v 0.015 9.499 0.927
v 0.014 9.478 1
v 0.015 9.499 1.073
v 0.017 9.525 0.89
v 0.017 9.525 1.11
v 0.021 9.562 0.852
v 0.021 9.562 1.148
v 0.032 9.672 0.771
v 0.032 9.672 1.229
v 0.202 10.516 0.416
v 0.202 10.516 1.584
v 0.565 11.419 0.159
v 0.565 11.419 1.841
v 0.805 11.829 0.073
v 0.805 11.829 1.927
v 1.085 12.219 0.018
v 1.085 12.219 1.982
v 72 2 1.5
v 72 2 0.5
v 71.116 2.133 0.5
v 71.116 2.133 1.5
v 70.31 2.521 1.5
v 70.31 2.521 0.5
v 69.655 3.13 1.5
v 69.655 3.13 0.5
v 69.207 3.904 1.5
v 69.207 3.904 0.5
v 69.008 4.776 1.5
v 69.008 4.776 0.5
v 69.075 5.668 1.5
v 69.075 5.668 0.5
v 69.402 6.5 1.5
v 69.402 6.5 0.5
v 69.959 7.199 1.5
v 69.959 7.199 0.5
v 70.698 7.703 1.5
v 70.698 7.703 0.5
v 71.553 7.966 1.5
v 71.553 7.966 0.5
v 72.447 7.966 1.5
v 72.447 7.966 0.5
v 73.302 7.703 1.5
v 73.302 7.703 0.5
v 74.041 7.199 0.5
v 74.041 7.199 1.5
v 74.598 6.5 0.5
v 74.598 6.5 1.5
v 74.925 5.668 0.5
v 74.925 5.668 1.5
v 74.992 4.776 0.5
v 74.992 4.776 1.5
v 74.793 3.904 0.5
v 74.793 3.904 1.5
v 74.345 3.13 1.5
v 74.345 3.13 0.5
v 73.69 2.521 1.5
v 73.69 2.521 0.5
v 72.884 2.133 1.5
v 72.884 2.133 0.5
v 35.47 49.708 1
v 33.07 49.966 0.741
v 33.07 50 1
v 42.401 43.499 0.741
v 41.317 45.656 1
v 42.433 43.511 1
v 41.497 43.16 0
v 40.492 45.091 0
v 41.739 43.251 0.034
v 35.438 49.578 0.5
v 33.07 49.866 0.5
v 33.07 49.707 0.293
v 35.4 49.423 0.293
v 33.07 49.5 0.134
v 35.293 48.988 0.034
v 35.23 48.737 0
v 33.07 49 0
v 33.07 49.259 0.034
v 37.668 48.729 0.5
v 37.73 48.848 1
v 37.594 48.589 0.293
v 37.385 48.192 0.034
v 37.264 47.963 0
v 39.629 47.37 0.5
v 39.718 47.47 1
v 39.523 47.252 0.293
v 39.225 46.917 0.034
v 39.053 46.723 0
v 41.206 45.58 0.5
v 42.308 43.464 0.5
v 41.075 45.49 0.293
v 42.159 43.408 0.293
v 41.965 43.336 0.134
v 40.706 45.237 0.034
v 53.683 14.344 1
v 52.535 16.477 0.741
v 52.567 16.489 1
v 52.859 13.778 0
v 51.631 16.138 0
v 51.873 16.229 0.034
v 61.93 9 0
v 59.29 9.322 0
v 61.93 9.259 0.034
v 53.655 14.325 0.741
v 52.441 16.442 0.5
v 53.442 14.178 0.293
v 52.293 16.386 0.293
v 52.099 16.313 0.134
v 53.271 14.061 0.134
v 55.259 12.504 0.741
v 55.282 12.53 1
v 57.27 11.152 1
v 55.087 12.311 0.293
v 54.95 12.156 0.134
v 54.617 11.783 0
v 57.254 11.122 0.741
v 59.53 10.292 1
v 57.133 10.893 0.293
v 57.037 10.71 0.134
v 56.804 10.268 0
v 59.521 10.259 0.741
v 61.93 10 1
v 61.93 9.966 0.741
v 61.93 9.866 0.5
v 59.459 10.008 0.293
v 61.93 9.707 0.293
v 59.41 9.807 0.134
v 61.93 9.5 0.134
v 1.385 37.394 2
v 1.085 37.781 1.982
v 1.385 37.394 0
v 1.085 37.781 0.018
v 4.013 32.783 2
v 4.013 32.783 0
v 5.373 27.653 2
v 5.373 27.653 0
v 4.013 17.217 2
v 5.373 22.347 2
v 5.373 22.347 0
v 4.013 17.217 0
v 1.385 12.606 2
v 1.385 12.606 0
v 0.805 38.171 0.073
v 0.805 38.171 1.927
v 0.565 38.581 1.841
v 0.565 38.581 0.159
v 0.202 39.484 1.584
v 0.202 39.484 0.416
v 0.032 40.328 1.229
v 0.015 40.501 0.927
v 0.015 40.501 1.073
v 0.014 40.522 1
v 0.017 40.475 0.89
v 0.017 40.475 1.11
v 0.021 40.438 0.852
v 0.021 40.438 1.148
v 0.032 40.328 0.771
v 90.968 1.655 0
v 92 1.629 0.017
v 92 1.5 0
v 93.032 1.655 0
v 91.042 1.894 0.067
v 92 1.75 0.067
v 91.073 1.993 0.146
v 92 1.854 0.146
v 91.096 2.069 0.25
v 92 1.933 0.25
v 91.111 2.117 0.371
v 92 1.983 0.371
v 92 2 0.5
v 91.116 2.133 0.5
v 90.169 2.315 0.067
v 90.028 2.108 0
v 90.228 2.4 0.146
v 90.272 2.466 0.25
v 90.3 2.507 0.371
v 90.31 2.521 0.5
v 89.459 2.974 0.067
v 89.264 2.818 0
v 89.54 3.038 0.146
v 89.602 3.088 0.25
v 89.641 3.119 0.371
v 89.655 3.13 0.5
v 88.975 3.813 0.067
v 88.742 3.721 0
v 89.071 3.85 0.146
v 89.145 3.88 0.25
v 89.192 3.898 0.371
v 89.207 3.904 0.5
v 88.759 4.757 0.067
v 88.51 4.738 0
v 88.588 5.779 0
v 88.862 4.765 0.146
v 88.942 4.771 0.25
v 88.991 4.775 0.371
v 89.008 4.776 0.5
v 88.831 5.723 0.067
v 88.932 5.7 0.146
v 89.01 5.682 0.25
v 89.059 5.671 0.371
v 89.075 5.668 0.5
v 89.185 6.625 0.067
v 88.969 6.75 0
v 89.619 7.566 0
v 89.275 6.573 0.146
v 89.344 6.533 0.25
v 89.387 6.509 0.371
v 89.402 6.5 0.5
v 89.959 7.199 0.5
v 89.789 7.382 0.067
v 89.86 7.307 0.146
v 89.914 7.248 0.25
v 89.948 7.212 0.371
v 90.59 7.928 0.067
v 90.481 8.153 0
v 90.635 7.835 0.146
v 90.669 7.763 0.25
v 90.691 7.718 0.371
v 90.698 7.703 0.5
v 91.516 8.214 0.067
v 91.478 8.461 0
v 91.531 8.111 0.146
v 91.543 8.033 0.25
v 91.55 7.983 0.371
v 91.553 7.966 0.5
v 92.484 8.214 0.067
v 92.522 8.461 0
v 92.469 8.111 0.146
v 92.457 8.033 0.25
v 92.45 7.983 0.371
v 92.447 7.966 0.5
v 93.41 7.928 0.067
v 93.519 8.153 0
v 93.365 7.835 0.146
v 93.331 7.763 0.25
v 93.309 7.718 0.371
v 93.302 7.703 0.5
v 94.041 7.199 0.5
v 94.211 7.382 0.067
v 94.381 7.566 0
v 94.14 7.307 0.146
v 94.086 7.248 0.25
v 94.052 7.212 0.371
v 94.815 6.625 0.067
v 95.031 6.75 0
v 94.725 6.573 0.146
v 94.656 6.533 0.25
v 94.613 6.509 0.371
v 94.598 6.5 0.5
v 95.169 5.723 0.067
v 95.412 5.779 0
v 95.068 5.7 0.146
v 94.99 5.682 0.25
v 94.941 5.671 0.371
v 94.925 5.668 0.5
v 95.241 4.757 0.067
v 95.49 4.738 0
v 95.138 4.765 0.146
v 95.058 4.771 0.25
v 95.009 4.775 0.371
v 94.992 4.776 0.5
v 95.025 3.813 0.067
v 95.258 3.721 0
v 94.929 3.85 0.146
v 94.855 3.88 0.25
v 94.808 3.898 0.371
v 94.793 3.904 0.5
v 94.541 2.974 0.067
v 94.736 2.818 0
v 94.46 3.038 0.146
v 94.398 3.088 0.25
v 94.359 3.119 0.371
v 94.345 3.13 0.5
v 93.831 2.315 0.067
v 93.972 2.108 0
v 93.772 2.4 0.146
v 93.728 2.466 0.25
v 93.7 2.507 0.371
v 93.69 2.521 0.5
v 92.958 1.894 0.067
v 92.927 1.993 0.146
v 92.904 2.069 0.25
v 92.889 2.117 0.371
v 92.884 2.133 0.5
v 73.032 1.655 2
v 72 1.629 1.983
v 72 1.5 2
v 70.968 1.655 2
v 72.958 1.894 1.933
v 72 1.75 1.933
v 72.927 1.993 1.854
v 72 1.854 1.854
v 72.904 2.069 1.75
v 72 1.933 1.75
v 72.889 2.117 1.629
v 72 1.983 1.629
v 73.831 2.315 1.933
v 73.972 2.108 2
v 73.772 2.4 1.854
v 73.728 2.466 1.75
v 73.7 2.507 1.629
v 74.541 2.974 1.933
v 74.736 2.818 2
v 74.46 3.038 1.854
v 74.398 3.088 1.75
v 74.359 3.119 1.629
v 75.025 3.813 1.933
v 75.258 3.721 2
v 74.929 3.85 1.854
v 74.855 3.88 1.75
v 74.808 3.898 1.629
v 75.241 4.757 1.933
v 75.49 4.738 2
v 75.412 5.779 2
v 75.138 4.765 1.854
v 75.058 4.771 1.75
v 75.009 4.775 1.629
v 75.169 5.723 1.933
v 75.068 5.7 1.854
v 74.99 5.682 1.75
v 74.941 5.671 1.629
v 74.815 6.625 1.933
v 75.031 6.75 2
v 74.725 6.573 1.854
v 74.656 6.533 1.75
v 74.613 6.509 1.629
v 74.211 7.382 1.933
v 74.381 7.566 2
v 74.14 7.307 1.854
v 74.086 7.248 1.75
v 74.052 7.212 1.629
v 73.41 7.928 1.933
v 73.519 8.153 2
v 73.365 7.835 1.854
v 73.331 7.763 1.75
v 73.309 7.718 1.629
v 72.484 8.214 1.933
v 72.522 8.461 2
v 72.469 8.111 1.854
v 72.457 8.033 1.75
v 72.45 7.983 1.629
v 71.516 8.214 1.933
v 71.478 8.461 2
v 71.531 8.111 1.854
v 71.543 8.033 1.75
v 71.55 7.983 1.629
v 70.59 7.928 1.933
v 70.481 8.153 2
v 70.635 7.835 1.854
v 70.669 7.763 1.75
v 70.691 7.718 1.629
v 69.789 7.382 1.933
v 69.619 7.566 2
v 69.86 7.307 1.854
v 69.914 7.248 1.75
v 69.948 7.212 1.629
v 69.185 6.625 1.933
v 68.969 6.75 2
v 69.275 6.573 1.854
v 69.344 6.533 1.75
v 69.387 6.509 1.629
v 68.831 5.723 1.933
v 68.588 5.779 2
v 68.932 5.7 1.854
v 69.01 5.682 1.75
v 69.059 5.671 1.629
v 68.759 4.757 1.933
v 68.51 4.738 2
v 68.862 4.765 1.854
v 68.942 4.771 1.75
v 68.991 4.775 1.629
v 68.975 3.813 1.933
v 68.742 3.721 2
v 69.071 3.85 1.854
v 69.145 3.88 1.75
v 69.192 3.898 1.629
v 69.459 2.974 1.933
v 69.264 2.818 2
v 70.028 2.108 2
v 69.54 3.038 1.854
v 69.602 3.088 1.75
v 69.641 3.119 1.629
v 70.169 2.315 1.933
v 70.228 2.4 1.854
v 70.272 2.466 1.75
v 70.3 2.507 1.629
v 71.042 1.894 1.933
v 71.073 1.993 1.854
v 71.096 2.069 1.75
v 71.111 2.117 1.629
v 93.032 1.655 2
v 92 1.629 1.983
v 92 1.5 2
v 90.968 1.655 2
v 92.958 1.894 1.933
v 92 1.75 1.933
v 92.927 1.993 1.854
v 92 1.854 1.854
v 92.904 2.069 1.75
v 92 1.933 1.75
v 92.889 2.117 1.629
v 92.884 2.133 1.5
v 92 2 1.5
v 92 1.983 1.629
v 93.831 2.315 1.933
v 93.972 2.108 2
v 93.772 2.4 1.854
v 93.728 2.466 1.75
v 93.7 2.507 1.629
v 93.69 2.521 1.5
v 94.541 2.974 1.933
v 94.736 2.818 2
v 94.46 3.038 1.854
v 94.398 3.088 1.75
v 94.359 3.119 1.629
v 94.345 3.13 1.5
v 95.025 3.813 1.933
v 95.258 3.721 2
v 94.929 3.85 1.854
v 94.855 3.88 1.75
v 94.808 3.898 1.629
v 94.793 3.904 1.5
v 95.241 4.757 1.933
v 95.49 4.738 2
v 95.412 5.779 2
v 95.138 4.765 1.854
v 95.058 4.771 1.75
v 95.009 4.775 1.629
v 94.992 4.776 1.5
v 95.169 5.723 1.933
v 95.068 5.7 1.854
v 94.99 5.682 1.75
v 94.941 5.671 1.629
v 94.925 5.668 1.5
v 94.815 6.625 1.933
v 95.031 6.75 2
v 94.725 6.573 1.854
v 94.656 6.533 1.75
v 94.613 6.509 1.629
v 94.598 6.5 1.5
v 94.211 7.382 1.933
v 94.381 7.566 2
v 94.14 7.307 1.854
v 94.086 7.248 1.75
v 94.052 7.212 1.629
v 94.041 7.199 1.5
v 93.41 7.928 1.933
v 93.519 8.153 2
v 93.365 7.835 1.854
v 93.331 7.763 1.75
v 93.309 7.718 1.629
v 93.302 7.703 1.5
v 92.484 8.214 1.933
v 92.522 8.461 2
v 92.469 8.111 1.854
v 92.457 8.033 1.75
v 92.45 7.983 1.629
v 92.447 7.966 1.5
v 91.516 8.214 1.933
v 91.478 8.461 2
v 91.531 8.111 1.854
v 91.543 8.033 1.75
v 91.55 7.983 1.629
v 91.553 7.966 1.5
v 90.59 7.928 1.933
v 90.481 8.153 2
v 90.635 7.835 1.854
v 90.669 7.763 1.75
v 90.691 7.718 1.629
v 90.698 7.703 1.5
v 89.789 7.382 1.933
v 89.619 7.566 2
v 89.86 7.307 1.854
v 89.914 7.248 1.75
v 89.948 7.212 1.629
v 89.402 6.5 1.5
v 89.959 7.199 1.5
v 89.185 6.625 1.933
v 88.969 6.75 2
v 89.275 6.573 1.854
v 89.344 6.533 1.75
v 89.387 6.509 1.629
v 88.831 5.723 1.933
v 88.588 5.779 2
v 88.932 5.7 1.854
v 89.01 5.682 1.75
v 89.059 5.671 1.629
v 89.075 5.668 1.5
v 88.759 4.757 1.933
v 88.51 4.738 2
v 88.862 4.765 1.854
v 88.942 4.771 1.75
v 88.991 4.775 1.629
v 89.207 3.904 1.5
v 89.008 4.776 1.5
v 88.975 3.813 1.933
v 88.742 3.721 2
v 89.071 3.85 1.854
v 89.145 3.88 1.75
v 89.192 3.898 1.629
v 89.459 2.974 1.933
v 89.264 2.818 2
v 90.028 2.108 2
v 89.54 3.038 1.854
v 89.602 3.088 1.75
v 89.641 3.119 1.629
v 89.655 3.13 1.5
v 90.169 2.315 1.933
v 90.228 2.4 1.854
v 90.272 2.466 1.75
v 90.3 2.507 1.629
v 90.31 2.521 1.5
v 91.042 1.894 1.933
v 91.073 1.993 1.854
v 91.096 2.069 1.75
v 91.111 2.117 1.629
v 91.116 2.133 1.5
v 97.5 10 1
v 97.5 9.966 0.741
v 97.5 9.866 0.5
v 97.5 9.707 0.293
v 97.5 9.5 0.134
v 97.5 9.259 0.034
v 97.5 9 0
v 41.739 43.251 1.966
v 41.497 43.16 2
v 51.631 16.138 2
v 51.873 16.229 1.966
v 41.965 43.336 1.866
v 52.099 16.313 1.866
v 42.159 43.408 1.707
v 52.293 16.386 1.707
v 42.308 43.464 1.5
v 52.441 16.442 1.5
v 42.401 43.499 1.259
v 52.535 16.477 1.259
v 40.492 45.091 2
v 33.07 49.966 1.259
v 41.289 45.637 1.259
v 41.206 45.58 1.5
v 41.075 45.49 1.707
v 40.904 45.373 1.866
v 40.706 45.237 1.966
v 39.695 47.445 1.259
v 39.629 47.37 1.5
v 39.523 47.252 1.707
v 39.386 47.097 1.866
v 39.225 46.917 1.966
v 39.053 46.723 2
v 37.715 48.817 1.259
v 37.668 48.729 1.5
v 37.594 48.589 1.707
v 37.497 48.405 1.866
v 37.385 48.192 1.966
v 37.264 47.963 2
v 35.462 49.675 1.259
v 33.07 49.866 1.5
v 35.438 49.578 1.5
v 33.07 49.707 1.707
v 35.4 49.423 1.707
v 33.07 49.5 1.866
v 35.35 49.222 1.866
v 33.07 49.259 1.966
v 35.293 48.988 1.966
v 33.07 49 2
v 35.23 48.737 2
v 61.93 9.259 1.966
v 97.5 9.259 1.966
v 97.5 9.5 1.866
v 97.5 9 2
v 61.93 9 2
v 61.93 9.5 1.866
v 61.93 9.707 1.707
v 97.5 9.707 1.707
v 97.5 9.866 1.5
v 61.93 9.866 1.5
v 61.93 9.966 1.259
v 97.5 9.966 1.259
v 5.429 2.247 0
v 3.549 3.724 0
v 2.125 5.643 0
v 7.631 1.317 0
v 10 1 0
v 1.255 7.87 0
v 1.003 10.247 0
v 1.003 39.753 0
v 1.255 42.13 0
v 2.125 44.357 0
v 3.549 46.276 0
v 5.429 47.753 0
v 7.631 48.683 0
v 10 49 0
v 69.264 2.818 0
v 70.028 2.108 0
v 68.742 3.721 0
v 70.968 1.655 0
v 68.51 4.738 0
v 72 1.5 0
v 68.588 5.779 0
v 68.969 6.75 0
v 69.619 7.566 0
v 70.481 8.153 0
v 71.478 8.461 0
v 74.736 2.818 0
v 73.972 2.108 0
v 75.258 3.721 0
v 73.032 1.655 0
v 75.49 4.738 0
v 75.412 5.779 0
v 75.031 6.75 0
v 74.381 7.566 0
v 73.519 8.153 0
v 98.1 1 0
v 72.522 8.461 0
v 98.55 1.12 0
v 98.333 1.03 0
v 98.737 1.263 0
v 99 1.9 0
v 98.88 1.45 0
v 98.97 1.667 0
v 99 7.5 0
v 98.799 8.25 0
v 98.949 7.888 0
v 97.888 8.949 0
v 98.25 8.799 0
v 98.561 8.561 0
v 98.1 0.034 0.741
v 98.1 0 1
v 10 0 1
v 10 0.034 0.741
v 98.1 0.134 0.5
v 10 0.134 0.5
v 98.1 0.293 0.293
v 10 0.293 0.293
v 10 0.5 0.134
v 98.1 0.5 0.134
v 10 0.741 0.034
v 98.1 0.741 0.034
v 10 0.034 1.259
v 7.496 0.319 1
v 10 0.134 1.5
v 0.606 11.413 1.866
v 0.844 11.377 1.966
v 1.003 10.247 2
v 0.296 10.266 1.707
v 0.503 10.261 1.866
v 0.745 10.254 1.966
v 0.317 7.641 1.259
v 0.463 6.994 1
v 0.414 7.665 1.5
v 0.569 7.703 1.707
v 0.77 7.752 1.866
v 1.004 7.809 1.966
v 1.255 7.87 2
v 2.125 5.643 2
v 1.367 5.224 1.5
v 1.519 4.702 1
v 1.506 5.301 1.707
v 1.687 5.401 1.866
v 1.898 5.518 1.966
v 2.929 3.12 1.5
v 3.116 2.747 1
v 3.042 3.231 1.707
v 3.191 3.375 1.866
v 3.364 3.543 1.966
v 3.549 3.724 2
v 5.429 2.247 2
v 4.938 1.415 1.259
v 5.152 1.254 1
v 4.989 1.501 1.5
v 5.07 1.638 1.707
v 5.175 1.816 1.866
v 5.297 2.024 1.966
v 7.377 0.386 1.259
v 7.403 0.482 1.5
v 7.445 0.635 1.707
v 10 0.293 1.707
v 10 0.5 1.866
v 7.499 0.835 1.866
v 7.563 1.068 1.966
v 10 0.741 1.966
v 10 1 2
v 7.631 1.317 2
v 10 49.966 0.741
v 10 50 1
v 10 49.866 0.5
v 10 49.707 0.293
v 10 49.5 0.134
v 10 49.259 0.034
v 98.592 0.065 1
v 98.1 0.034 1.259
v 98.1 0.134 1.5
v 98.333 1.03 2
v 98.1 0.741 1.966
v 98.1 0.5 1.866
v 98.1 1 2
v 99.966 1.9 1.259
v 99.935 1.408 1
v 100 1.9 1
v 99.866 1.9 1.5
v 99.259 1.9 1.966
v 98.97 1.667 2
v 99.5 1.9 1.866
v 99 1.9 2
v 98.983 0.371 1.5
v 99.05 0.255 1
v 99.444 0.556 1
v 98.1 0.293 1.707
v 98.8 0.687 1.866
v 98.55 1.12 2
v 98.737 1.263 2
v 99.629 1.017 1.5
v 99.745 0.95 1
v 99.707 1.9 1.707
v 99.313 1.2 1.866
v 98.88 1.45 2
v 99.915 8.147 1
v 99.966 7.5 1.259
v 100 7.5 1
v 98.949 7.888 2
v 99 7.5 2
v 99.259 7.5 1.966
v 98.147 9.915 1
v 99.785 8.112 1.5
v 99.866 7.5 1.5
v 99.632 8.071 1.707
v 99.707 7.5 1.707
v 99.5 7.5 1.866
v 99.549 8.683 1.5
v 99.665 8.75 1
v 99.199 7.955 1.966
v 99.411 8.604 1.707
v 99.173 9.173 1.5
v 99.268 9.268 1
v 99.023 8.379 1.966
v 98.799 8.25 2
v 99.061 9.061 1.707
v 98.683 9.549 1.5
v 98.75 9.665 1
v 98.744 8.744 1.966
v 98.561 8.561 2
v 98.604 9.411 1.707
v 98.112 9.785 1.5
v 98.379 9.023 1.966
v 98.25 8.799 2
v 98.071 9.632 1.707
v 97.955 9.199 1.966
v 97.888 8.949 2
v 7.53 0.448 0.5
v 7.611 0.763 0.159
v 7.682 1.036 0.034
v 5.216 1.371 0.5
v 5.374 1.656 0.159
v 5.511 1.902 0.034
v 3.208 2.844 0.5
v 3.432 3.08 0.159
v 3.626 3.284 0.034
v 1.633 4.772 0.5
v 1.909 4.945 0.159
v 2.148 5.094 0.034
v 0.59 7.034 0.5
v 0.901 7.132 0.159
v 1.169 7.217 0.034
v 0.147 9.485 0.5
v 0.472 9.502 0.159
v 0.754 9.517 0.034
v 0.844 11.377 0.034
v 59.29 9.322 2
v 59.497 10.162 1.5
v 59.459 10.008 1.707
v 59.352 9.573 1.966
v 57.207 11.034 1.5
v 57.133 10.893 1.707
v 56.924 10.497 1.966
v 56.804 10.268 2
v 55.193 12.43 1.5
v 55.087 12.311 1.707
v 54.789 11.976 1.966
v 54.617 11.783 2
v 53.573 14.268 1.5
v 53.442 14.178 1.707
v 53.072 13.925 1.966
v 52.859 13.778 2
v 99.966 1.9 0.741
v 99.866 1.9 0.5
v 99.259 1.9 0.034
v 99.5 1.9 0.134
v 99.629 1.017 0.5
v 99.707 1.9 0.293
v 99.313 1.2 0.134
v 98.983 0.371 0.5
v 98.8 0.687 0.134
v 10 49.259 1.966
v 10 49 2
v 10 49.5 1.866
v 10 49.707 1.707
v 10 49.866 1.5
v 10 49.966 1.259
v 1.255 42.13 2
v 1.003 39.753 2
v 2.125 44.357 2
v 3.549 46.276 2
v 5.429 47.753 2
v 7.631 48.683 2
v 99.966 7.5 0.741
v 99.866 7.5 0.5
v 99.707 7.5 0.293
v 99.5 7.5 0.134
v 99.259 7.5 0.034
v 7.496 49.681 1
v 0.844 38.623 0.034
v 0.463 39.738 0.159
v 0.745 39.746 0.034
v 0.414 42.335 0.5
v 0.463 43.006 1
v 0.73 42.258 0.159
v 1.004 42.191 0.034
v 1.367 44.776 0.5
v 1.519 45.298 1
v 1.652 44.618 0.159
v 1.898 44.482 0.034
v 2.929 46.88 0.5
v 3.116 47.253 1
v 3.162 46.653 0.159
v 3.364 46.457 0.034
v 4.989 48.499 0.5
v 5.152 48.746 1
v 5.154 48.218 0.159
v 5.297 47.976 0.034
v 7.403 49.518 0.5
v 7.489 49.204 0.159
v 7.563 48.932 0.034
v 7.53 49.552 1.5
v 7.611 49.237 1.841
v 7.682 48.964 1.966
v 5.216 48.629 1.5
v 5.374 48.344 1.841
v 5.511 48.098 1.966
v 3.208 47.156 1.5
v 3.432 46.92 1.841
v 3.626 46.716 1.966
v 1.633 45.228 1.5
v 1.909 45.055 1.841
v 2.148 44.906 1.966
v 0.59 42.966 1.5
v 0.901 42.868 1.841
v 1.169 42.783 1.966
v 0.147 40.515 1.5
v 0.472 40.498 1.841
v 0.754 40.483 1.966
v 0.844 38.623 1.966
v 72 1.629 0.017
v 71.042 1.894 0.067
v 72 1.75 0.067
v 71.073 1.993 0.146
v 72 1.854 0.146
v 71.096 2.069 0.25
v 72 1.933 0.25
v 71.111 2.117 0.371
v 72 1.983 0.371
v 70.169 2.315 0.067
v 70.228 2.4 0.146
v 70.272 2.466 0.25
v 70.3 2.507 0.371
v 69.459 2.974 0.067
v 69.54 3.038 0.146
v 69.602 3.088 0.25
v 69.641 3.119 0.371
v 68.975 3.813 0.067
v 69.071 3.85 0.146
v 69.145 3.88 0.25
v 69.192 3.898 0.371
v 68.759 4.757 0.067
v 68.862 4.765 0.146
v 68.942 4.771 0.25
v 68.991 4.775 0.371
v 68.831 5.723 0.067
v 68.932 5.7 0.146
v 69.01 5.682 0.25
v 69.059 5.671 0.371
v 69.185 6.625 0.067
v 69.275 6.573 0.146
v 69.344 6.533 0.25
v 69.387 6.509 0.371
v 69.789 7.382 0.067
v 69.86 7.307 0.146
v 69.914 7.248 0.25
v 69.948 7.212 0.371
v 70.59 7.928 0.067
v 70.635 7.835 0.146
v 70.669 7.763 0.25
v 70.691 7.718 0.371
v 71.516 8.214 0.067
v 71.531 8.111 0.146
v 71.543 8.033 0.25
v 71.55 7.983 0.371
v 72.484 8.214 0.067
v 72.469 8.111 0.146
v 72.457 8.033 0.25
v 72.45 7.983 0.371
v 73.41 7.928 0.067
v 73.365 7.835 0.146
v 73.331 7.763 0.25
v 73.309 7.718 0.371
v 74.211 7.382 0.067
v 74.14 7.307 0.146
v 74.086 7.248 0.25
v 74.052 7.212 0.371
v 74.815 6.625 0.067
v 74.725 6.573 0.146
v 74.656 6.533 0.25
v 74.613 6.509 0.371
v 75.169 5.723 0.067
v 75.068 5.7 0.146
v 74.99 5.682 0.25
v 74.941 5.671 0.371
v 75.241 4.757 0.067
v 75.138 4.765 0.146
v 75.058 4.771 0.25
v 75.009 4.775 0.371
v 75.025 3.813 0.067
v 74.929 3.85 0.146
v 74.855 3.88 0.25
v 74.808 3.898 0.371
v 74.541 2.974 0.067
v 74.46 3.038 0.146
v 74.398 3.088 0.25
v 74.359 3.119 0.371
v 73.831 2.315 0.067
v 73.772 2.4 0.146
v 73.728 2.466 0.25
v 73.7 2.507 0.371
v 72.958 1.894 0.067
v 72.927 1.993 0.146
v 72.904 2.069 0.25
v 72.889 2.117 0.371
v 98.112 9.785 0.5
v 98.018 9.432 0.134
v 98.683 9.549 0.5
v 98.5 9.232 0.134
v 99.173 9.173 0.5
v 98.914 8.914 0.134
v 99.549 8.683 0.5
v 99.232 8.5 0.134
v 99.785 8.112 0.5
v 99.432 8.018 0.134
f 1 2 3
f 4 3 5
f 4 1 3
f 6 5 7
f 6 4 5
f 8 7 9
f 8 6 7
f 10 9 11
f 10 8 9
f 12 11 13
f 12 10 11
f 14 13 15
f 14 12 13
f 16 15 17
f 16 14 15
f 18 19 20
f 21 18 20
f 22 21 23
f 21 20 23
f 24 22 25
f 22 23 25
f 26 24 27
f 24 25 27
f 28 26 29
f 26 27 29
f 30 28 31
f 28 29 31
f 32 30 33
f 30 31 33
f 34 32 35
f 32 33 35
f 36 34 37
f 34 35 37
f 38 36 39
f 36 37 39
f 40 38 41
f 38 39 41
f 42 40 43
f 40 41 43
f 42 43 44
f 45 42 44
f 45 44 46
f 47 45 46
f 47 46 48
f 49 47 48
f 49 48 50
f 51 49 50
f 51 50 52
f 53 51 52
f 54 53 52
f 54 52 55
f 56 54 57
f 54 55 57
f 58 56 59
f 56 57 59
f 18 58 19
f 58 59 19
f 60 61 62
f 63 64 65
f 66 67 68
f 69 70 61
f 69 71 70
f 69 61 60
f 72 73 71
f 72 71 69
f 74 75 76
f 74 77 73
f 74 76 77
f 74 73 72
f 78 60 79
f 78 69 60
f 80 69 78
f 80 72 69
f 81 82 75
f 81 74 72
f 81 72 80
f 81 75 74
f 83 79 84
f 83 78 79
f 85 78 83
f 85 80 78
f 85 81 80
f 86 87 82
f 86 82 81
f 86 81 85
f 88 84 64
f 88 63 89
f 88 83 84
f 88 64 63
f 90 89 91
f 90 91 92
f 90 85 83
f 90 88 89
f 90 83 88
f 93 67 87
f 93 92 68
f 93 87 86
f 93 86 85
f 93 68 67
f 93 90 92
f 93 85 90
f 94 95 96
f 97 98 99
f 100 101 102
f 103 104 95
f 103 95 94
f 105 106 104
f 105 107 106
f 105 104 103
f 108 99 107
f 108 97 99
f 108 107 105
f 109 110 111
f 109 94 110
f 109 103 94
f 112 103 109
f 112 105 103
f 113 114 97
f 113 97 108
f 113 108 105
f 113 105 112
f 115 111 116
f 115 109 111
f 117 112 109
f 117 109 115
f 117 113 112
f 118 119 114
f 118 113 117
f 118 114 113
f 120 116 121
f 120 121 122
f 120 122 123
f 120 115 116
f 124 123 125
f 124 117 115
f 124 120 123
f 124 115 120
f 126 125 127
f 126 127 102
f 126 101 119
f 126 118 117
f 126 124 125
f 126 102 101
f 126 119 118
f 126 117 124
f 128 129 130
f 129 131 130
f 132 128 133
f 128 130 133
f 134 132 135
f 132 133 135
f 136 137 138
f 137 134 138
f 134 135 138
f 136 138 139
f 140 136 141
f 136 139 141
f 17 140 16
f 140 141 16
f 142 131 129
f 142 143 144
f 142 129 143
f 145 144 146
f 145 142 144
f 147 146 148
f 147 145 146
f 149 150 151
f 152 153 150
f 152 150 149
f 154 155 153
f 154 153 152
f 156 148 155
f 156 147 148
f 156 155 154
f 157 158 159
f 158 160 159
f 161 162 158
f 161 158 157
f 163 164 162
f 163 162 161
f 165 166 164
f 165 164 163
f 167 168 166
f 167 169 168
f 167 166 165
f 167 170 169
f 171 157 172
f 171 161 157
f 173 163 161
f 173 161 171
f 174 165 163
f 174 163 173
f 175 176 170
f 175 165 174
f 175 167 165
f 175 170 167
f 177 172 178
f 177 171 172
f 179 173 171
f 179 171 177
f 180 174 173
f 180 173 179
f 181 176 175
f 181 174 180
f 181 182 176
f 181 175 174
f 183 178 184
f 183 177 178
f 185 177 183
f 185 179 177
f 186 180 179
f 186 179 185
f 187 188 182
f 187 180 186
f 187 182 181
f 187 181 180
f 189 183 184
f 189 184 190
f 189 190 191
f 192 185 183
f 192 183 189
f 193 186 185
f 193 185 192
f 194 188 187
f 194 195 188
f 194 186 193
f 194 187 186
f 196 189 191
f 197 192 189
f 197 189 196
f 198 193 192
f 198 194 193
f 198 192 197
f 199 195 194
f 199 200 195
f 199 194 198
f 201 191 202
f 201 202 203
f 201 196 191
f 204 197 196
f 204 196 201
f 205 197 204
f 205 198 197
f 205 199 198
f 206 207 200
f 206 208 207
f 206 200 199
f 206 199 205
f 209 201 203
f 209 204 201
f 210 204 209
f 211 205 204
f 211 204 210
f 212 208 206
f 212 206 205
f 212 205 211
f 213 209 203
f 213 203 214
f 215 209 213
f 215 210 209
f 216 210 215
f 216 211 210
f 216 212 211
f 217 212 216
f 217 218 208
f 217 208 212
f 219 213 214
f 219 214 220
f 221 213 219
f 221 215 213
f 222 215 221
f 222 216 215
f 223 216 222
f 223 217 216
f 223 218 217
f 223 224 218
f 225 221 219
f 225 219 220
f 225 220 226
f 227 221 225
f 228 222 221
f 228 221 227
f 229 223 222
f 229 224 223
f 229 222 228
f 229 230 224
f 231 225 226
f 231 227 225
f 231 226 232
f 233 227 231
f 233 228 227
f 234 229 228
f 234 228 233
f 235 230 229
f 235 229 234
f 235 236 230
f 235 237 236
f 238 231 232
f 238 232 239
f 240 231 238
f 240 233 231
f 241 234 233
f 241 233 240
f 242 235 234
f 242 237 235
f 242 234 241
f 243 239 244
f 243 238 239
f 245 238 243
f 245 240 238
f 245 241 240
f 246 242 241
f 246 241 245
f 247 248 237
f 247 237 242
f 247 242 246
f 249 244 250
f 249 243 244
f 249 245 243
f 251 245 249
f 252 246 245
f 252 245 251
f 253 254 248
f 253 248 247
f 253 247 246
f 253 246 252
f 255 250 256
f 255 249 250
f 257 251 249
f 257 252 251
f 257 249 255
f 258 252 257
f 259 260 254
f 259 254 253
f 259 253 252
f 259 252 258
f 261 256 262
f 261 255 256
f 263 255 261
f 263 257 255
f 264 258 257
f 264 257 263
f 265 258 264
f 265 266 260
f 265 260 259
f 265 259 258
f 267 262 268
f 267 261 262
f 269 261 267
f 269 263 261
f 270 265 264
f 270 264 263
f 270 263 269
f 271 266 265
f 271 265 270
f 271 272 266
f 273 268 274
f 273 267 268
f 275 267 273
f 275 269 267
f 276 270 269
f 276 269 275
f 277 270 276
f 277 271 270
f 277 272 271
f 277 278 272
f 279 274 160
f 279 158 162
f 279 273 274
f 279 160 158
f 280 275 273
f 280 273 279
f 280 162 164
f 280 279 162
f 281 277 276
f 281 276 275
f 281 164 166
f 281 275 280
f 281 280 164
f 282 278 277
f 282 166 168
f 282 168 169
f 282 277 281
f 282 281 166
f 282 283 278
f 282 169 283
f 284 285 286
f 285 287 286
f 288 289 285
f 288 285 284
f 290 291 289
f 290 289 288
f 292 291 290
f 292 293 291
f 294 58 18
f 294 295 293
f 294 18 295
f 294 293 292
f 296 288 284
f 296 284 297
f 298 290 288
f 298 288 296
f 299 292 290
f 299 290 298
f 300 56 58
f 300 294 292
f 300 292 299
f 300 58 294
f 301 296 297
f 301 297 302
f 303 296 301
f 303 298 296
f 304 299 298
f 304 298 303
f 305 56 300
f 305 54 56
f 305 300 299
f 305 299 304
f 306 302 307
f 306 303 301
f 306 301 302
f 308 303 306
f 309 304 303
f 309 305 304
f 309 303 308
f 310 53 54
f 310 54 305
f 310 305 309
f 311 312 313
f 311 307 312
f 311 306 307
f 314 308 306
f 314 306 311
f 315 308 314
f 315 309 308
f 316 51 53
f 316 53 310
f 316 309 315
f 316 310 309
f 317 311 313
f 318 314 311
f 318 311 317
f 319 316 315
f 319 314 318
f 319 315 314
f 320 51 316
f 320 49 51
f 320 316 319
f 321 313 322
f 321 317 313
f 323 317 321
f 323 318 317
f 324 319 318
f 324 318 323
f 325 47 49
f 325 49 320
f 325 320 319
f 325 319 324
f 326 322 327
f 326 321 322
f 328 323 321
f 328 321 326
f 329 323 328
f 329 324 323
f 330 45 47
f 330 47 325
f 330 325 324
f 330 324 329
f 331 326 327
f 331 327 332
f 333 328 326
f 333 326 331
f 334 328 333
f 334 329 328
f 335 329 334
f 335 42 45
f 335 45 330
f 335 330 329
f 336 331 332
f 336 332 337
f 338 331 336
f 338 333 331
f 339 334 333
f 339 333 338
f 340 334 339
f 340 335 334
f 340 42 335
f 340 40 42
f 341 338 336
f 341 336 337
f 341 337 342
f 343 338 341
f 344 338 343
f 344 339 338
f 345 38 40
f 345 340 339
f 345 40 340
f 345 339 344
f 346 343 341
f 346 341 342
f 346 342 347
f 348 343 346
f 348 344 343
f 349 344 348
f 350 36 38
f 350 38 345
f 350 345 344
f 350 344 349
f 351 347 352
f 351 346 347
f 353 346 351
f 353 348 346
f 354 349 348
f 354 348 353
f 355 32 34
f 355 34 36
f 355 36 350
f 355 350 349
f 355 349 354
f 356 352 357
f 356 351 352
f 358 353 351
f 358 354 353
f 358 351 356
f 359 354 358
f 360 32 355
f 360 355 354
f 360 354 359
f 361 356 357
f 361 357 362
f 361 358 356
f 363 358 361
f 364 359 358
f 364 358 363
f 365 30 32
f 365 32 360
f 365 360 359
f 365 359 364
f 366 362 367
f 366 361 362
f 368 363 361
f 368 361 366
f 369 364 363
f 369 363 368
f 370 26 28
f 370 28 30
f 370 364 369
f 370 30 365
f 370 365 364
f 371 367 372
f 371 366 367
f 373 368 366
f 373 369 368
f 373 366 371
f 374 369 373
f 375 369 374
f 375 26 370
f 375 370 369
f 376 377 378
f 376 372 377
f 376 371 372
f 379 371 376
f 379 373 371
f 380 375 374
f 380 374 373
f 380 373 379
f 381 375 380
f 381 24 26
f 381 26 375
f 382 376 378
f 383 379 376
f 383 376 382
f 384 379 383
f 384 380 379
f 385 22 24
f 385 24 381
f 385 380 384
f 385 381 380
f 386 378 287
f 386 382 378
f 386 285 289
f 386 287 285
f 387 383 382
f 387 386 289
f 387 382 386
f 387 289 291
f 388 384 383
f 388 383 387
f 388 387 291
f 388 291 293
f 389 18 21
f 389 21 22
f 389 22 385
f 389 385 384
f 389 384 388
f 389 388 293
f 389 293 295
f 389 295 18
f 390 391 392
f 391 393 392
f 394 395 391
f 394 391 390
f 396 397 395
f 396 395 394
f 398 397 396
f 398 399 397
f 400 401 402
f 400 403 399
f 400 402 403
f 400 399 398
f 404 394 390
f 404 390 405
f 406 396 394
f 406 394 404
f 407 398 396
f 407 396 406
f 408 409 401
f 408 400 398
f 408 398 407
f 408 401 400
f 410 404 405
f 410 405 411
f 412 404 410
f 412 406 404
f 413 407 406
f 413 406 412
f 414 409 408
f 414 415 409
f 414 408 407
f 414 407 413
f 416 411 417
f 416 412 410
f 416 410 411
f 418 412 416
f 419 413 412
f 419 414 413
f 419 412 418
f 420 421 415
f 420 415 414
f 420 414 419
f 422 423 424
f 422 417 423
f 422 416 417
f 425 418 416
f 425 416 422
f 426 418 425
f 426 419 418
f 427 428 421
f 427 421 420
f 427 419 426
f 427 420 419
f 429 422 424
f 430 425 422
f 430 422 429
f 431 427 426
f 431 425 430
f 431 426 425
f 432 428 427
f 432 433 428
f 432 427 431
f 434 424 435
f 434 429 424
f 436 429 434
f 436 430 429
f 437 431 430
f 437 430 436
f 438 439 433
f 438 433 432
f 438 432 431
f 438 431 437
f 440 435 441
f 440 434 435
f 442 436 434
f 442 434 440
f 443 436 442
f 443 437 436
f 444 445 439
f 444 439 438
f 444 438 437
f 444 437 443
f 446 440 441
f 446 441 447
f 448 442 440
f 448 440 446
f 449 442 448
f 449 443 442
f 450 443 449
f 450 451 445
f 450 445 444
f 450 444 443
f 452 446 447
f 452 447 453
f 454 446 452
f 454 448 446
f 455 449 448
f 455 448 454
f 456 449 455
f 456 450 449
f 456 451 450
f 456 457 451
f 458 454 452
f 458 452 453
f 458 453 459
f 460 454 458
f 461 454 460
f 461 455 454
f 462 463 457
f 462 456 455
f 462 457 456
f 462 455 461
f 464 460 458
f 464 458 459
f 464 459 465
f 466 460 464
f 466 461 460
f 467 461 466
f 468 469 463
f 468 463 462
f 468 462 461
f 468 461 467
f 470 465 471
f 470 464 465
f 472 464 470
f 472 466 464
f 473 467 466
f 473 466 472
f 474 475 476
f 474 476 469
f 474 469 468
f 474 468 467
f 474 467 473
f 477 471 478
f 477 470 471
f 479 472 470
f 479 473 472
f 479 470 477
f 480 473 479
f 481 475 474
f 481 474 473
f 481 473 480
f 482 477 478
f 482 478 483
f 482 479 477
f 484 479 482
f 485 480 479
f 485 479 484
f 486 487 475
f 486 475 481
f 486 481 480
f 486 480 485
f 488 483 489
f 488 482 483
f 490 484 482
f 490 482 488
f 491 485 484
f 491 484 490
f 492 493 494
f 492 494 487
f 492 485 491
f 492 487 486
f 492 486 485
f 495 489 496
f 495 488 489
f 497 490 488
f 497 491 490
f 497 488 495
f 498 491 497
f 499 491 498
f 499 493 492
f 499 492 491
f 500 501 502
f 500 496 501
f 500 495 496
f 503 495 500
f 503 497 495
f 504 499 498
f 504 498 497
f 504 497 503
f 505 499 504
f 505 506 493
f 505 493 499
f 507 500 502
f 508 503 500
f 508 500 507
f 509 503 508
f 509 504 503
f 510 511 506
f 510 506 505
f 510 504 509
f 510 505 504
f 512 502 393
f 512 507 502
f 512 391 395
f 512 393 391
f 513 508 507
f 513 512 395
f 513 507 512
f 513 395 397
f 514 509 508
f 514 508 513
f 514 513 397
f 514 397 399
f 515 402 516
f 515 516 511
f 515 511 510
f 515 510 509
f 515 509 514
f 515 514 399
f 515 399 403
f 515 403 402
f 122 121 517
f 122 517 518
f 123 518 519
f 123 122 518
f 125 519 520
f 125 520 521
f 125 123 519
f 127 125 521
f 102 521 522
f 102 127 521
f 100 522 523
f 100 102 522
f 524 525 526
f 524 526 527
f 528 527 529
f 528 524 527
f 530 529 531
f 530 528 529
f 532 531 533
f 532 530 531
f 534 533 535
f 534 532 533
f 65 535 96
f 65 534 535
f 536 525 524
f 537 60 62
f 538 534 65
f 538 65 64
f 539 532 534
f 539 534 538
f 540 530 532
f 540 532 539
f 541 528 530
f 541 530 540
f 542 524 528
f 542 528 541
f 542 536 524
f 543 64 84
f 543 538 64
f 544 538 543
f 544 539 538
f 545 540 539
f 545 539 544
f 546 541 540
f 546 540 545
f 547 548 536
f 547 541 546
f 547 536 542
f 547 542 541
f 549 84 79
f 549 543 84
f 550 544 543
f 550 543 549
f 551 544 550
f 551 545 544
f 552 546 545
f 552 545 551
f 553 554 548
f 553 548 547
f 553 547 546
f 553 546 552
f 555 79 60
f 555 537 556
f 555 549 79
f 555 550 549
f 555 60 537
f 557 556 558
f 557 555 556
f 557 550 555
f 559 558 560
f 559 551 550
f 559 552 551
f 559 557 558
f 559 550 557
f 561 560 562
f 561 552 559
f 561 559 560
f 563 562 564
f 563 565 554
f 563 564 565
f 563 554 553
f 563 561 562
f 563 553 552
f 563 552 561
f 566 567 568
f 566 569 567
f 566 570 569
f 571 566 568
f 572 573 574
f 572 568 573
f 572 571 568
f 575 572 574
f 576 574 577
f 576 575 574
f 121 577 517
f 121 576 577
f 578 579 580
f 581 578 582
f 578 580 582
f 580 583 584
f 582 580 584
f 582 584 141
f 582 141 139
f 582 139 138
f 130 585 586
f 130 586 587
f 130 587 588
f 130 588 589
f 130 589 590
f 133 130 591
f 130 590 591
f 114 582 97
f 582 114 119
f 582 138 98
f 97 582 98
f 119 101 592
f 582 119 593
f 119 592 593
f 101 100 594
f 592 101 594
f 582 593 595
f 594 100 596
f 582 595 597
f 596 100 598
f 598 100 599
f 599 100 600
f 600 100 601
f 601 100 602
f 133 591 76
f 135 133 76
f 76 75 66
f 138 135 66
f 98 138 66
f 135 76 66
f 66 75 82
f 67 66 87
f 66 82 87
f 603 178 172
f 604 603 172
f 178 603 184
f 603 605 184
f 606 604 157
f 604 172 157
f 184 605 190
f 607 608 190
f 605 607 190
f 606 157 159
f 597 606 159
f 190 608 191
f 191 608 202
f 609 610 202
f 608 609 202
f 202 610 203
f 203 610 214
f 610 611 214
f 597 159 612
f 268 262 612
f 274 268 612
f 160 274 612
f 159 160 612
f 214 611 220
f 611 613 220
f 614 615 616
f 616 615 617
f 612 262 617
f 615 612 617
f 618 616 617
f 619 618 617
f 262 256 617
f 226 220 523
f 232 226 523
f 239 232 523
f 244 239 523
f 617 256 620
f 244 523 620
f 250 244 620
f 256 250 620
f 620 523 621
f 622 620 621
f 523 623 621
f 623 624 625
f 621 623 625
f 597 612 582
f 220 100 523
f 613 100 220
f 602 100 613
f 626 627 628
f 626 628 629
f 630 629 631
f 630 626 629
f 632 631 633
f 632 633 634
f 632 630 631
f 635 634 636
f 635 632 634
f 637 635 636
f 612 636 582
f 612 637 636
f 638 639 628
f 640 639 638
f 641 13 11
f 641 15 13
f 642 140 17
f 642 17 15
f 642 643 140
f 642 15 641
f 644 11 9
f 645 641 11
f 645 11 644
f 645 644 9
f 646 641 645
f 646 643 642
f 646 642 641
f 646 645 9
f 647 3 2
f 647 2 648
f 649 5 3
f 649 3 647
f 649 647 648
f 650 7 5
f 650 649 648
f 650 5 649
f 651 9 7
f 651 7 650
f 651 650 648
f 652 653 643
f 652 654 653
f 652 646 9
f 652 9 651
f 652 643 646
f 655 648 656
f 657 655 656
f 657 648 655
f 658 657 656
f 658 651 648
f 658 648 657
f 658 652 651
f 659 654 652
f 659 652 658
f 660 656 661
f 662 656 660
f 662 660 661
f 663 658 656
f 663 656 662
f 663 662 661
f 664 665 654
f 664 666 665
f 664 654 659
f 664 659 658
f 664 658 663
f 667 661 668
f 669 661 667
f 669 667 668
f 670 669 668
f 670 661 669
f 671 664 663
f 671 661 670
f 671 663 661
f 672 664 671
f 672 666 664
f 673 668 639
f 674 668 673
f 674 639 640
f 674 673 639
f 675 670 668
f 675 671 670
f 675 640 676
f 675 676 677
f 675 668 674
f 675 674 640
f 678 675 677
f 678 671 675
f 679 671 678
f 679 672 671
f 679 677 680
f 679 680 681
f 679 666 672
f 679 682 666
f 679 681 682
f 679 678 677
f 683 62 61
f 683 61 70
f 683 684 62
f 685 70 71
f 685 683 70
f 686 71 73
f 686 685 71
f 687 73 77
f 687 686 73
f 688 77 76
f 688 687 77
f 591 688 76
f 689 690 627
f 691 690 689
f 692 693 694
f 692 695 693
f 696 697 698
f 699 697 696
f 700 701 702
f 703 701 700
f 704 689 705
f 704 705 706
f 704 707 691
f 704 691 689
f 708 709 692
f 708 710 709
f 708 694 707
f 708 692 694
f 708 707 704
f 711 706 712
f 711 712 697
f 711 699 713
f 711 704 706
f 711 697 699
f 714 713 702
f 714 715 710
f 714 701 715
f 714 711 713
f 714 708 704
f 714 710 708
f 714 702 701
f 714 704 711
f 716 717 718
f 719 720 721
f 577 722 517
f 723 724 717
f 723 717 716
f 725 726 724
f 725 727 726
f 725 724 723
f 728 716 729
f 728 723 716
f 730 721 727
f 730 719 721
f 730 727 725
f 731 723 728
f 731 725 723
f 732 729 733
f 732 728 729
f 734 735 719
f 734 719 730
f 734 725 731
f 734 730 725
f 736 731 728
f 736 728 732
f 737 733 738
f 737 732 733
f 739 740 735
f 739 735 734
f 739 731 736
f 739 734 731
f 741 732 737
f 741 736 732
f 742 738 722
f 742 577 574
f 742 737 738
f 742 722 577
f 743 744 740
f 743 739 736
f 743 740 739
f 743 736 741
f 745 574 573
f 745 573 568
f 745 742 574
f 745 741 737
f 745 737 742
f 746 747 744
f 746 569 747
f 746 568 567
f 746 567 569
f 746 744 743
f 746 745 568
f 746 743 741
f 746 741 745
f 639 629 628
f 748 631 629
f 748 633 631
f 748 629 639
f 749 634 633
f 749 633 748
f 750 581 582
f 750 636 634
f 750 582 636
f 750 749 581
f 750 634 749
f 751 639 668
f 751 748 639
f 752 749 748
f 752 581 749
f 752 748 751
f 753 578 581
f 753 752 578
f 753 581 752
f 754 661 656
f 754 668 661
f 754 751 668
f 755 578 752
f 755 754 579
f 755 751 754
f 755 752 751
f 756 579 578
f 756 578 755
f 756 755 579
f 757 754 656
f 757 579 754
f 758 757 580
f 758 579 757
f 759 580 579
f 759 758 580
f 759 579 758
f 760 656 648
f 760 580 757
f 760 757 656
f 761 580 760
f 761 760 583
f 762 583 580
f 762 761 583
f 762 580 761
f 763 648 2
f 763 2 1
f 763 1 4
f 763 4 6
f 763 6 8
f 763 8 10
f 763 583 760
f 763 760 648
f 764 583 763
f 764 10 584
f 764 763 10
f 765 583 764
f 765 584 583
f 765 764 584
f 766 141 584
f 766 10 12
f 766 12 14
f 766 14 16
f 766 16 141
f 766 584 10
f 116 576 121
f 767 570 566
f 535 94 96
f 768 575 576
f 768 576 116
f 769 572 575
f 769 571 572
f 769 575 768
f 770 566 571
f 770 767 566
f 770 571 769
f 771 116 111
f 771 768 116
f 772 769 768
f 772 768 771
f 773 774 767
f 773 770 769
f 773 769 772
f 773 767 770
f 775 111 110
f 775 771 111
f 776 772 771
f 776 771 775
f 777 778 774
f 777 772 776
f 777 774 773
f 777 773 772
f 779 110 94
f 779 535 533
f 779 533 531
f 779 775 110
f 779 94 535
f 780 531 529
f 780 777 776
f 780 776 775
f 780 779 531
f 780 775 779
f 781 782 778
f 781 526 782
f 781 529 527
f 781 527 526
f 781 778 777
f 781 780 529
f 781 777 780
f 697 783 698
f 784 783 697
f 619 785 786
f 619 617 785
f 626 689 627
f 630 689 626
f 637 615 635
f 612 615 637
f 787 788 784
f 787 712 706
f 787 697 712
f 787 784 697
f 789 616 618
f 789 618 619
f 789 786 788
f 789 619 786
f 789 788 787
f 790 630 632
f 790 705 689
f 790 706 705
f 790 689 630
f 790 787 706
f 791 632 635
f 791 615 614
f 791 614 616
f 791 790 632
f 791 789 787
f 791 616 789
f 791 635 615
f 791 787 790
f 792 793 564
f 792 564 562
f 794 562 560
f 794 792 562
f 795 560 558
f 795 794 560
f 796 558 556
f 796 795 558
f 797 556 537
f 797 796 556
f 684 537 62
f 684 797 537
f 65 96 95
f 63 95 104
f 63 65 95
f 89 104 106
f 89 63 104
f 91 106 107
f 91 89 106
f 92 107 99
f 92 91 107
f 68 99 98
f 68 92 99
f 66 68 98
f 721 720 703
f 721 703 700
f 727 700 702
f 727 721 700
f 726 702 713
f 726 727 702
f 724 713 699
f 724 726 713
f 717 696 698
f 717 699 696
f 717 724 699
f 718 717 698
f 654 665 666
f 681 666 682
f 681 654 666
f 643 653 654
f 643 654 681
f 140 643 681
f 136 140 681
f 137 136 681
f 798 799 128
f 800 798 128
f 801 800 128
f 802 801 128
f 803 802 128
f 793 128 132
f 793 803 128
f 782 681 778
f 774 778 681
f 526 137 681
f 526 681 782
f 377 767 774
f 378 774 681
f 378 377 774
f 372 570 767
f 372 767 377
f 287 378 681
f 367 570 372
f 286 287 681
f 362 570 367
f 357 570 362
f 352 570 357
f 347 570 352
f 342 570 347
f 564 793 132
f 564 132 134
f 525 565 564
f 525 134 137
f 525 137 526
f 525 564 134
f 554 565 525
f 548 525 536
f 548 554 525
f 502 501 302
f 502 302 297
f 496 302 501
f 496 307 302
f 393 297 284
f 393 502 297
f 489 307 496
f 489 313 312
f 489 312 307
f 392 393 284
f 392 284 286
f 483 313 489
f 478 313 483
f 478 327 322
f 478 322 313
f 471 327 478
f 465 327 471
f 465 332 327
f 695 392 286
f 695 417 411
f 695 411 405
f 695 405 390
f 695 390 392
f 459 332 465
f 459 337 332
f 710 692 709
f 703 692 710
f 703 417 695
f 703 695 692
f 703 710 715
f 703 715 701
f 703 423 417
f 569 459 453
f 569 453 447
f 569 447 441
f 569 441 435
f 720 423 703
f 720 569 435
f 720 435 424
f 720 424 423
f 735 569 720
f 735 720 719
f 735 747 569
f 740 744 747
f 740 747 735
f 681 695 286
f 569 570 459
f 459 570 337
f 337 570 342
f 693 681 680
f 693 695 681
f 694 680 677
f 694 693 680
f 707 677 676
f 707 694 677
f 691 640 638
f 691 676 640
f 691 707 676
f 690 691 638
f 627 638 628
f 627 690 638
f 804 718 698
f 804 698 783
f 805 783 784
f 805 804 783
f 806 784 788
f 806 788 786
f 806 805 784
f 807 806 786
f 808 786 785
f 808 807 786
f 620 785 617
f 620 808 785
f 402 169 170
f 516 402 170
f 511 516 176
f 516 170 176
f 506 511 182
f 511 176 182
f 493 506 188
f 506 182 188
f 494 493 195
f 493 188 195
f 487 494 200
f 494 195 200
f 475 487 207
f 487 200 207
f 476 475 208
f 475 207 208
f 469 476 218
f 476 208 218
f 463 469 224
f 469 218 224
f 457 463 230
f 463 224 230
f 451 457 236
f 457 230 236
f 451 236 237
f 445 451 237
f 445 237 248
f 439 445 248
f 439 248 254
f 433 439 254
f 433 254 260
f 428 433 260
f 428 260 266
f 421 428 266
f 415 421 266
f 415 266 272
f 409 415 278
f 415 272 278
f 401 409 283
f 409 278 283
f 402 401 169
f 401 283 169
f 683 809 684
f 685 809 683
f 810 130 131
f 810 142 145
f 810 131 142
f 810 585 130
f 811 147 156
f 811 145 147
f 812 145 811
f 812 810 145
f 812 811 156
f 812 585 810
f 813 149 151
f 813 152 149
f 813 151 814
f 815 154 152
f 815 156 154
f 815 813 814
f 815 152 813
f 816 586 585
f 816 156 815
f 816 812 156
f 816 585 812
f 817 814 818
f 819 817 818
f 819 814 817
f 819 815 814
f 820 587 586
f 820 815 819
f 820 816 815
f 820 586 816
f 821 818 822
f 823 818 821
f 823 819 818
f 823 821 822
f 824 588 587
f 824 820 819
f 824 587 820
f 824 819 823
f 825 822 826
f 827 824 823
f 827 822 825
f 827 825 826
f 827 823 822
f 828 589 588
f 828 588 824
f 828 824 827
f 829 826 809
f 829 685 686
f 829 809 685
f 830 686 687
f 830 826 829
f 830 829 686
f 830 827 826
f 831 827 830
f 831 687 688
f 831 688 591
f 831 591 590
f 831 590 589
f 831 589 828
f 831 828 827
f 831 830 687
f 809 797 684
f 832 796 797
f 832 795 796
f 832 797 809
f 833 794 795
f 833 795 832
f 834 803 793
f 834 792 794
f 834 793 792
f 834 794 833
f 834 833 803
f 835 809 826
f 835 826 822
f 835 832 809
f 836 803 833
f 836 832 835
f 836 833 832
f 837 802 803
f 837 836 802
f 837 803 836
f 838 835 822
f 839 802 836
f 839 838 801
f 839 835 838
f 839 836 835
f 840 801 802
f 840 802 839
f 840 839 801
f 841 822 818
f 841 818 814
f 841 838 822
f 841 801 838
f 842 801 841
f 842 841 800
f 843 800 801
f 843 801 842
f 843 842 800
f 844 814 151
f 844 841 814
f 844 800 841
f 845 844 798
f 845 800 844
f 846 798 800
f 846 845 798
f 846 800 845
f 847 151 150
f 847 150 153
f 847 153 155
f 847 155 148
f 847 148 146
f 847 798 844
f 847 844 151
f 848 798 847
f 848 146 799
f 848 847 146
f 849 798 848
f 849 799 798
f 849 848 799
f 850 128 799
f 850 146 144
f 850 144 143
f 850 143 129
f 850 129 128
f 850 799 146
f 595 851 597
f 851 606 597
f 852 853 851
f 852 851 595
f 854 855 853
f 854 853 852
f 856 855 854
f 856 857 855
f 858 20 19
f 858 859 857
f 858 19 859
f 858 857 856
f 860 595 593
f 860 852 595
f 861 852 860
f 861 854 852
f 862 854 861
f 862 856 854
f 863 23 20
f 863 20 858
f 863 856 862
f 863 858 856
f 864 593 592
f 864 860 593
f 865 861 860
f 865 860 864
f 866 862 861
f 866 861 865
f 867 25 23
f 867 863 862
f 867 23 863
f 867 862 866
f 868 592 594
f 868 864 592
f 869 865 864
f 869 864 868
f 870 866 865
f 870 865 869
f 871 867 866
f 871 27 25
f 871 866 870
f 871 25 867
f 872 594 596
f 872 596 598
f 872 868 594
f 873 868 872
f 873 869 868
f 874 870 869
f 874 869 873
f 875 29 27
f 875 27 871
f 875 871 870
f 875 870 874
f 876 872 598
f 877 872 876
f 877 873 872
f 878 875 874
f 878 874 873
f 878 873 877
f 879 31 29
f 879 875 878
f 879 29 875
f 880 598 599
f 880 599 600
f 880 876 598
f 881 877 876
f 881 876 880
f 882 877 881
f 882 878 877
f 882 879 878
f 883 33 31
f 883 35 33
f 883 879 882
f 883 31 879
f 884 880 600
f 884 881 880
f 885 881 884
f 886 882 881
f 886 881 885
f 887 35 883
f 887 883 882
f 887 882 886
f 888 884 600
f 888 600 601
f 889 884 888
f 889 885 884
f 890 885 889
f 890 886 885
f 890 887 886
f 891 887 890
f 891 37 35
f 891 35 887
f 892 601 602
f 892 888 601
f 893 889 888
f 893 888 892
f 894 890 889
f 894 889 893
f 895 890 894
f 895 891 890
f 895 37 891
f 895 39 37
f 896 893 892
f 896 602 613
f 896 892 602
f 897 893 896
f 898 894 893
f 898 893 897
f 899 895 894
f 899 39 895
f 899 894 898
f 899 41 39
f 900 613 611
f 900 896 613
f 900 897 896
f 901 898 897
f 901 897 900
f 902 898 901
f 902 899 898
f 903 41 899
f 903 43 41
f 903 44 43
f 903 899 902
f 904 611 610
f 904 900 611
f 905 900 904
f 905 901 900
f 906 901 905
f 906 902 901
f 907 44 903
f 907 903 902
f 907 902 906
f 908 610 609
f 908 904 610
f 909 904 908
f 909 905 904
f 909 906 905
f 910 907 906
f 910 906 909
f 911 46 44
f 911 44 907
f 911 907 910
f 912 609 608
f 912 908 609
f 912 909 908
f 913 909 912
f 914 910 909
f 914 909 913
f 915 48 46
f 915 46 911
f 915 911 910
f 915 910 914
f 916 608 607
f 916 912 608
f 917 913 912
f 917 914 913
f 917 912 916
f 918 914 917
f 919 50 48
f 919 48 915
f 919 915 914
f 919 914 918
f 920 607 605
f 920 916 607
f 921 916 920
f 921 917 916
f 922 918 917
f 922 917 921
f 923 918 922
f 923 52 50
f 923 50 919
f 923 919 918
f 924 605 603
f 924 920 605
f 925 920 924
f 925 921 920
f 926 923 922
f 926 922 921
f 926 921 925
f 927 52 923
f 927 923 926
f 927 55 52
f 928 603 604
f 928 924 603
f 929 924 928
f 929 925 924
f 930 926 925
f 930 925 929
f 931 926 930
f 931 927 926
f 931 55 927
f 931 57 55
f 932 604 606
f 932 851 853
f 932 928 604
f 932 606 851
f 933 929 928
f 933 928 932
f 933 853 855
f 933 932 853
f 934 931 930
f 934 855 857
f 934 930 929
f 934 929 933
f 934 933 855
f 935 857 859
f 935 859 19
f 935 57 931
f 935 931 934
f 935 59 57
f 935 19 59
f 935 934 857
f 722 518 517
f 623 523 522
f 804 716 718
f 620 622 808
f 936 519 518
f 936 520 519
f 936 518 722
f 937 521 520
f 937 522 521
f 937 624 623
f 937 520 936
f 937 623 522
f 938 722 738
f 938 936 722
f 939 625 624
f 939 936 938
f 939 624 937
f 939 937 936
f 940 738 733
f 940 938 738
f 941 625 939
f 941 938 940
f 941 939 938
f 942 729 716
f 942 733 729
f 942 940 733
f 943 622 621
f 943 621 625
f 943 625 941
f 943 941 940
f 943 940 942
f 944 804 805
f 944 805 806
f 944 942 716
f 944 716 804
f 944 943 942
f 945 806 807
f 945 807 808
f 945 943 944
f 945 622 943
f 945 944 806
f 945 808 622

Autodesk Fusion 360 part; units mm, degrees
sketch "Sketch1" plane through (0, 0, 0) normal (0, 0, 1) x (1, 0, 0)
  line L0 (10, 0) -> (55, 0)
  line L1 (55, 0) -> (98.1, 0)
  line L2 (100, 1.9) -> (100, 7.5)
  line L3 (97.5, 10) -> (61.93, 10)
  line L4 (52.5667, 16.4888) -> (42.4333, 43.5112)
  line L5 (10, 50) -> (33.07, 50)
  arc A0 (10, 50) -> (0, 40) centre (10, 40) ccw
  arc A1 (0, 10) -> (10, 0) centre (10, 10) ccw
  arc A2 (42.4333, 43.5112) -> (33.07, 50) centre (33.07, 40) ccw
  arc A3 (52.5667, 16.4888) -> (61.93, 10) centre (61.93, 20) ccw
  arc A4 (100, 7.5) -> (97.5, 10) centre (97.5, 7.5) ccw
  arc A5 (98.1, 0) -> (100, 1.9) centre (98.1, 1.9) ccw
  arc A6 (1.0853, 12.2193) -> (1.0853, 37.7807) centre (-15, 25) ccw
  line L6 (0, 40) -> (0, 40.8911)
  line L7 (0, 9.1089) -> (0, 10)
  arc A7 (0, 40.8911) -> (1.0853, 37.7807) centre (5, 40.8911) ccw
  arc A8 (1.0853, 12.2193) -> (0, 9.1089) centre (5, 9.1089) ccw
  point P0 (100, 0)
  point P1 (55, 10)
  dimension "d1" = 55
  dimension "d2" = 45
  dimension "d3" = 10
  dimension "d4" = 10
  dimension "d5" = 10
  dimension "d6" = 10
  dimension "d7" = 10
  dimension "d8" = 2.5
  dimension "d9" = 1.9
  dimension "d10" = 5
  dimension "d11" = 5
extrude "Extrude1" add sketch "Sketch1" along normal blind 2 contours L0 L1 L2 L3 L4 L5 A0 A1 A2 A3 A4 A5 A6 A7 A8
sketch "Sketch2" plane through (0, 0, 2) normal (0, 0, 1) x (-1, 0, 0)
  arc A0 (-10, -50) -> (-0.0136, -40.5221) centre (-10, -40) ccw
  arc A1 (-0.0136, -40.5221) -> (-1.0853, -37.7807) centre (-5, -40.8911) ccw
  arc A2 (-1.0853, -12.2193) -> (-1.0853, -37.7807) centre (15, -25) ccw
  arc A3 (-1.0853, -12.2193) -> (-0.0136, -9.4779) centre (-5, -9.1089) ccw
  arc A4 (-0.0136, -9.4779) -> (-10, 0) centre (-10, -10) ccw
  line L0 (-10, 0) -> (-98.1, 0)
  arc A5 (-98.1, 0) -> (-100, -1.9) centre (-98.1, -1.9) ccw
  line L1 (-100, -1.9) -> (-100, -7.5)
  arc A6 (-100, -7.5) -> (-97.5, -10) centre (-97.5, -7.5) ccw
  line L2 (-97.5, -10) -> (-61.93, -10)
  arc A7 (-52.5667, -16.4888) -> (-61.93, -10) centre (-61.93, -20) ccw
  line L3 (-52.5667, -16.4888) -> (-42.4333, -43.5112)
  arc A8 (-42.4333, -43.5112) -> (-33.07, -50) centre (-33.07, -40) ccw
  line L4 (-33.07, -50) -> (-10, -50)
  line L5 (-100, 0) -> (-92, 0)
  line L6 (-92, 0) -> (-92, -5)
  line L7 (-92, -5) -> (-100, -5)
  line L8 (-100, -5) -> (-100, 0)
  dimension "d14" = 8
  dimension "d15" = 5
hole "Hole1" at (92, 5, 2) direction (0, 0, -1) diameter 6 depth 11 tip angle 118
sketch "Sketch3" plane through (0, 0, 2) normal (0, 0, 1) x (-1, 0, 0)
  circle A0 centre (-92, -5) radius 3
  arc A1 (-10, -50) -> (-0.0136, -40.5221) centre (-10, -40) ccw
  arc A2 (-0.0136, -40.5221) -> (-1.0853, -37.7807) centre (-5, -40.8911) ccw
  arc A3 (-1.0853, -12.2193) -> (-1.0853, -37.7807) centre (15, -25) ccw
  arc A4 (-1.0853, -12.2193) -> (-0.0136, -9.4779) centre (-5, -9.1089) ccw
  arc A5 (-0.0136, -9.4779) -> (-10, 0) centre (-10, -10) ccw
  line L0 (-10, 0) -> (-98.1, 0)
  arc A6 (-98.1, 0) -> (-100, -1.9) centre (-98.1, -1.9) ccw
  line L1 (-100, -1.9) -> (-100, -7.5)
  arc A7 (-100, -7.5) -> (-97.5, -10) centre (-97.5, -7.5) ccw
  line L2 (-97.5, -10) -> (-61.93, -10)
  arc A8 (-52.5667, -16.4888) -> (-61.93, -10) centre (-61.93, -20) ccw
  line L3 (-52.5667, -16.4888) -> (-42.4333, -43.5112)
  arc A9 (-42.4333, -43.5112) -> (-33.07, -50) centre (-33.07, -40) ccw
  line L4 (-33.07, -50) -> (-10, -50)
  line L5 (-100, 0) -> (-72, 0)
  line L6 (-72, 0) -> (-72, -5)
  line L7 (-72, -5) -> (-100, -5)
  line L8 (-100, -5) -> (-100, 0)
  dimension "d19" = 28
  dimension "d20" = 5
hole "Hole2" at (72, 5, 2) direction (0, 0, -1) diameter 6 depth 11 tip angle 118
fillet "Fillet1" radius 1 22 edges at (3.116, 2.7467, 2) (54.05, 0, 2) (99.4435, 0.5565, 2) (100, 4.7, 2) (99.2678, 9.2678, 2) (79.715, 10, 2) (56.2341, 11.7807, 2) (47.5, 30, 2) (38.7659, 48.2193, 2) (21.535, 50, 2) (3.116, 47.2533, 2) (3.116, 2.7467, 0) (54.05, 0, 0) (99.4435, 0.5565, 0) (100, 4.7, 0) (99.2678, 9.2678, 0) (79.715, 10, 0) (56.2341, 11.7807, 0) (47.5, 30, 0) (38.7659, 48.2193, 0) (21.535, 50, 0) (3.116, 47.2533, 0)
fillet "Fillet2" radius 0.5 4 edges at (69.203, 3.9152, 0) (69.203, 6.0848, 2) (89.203, 3.9152, 0) (89.203, 6.0848, 2)
sketch "Sketch4" plane through (0, 0, 0) normal (0, 0, 1) x (1, 0, 0)
